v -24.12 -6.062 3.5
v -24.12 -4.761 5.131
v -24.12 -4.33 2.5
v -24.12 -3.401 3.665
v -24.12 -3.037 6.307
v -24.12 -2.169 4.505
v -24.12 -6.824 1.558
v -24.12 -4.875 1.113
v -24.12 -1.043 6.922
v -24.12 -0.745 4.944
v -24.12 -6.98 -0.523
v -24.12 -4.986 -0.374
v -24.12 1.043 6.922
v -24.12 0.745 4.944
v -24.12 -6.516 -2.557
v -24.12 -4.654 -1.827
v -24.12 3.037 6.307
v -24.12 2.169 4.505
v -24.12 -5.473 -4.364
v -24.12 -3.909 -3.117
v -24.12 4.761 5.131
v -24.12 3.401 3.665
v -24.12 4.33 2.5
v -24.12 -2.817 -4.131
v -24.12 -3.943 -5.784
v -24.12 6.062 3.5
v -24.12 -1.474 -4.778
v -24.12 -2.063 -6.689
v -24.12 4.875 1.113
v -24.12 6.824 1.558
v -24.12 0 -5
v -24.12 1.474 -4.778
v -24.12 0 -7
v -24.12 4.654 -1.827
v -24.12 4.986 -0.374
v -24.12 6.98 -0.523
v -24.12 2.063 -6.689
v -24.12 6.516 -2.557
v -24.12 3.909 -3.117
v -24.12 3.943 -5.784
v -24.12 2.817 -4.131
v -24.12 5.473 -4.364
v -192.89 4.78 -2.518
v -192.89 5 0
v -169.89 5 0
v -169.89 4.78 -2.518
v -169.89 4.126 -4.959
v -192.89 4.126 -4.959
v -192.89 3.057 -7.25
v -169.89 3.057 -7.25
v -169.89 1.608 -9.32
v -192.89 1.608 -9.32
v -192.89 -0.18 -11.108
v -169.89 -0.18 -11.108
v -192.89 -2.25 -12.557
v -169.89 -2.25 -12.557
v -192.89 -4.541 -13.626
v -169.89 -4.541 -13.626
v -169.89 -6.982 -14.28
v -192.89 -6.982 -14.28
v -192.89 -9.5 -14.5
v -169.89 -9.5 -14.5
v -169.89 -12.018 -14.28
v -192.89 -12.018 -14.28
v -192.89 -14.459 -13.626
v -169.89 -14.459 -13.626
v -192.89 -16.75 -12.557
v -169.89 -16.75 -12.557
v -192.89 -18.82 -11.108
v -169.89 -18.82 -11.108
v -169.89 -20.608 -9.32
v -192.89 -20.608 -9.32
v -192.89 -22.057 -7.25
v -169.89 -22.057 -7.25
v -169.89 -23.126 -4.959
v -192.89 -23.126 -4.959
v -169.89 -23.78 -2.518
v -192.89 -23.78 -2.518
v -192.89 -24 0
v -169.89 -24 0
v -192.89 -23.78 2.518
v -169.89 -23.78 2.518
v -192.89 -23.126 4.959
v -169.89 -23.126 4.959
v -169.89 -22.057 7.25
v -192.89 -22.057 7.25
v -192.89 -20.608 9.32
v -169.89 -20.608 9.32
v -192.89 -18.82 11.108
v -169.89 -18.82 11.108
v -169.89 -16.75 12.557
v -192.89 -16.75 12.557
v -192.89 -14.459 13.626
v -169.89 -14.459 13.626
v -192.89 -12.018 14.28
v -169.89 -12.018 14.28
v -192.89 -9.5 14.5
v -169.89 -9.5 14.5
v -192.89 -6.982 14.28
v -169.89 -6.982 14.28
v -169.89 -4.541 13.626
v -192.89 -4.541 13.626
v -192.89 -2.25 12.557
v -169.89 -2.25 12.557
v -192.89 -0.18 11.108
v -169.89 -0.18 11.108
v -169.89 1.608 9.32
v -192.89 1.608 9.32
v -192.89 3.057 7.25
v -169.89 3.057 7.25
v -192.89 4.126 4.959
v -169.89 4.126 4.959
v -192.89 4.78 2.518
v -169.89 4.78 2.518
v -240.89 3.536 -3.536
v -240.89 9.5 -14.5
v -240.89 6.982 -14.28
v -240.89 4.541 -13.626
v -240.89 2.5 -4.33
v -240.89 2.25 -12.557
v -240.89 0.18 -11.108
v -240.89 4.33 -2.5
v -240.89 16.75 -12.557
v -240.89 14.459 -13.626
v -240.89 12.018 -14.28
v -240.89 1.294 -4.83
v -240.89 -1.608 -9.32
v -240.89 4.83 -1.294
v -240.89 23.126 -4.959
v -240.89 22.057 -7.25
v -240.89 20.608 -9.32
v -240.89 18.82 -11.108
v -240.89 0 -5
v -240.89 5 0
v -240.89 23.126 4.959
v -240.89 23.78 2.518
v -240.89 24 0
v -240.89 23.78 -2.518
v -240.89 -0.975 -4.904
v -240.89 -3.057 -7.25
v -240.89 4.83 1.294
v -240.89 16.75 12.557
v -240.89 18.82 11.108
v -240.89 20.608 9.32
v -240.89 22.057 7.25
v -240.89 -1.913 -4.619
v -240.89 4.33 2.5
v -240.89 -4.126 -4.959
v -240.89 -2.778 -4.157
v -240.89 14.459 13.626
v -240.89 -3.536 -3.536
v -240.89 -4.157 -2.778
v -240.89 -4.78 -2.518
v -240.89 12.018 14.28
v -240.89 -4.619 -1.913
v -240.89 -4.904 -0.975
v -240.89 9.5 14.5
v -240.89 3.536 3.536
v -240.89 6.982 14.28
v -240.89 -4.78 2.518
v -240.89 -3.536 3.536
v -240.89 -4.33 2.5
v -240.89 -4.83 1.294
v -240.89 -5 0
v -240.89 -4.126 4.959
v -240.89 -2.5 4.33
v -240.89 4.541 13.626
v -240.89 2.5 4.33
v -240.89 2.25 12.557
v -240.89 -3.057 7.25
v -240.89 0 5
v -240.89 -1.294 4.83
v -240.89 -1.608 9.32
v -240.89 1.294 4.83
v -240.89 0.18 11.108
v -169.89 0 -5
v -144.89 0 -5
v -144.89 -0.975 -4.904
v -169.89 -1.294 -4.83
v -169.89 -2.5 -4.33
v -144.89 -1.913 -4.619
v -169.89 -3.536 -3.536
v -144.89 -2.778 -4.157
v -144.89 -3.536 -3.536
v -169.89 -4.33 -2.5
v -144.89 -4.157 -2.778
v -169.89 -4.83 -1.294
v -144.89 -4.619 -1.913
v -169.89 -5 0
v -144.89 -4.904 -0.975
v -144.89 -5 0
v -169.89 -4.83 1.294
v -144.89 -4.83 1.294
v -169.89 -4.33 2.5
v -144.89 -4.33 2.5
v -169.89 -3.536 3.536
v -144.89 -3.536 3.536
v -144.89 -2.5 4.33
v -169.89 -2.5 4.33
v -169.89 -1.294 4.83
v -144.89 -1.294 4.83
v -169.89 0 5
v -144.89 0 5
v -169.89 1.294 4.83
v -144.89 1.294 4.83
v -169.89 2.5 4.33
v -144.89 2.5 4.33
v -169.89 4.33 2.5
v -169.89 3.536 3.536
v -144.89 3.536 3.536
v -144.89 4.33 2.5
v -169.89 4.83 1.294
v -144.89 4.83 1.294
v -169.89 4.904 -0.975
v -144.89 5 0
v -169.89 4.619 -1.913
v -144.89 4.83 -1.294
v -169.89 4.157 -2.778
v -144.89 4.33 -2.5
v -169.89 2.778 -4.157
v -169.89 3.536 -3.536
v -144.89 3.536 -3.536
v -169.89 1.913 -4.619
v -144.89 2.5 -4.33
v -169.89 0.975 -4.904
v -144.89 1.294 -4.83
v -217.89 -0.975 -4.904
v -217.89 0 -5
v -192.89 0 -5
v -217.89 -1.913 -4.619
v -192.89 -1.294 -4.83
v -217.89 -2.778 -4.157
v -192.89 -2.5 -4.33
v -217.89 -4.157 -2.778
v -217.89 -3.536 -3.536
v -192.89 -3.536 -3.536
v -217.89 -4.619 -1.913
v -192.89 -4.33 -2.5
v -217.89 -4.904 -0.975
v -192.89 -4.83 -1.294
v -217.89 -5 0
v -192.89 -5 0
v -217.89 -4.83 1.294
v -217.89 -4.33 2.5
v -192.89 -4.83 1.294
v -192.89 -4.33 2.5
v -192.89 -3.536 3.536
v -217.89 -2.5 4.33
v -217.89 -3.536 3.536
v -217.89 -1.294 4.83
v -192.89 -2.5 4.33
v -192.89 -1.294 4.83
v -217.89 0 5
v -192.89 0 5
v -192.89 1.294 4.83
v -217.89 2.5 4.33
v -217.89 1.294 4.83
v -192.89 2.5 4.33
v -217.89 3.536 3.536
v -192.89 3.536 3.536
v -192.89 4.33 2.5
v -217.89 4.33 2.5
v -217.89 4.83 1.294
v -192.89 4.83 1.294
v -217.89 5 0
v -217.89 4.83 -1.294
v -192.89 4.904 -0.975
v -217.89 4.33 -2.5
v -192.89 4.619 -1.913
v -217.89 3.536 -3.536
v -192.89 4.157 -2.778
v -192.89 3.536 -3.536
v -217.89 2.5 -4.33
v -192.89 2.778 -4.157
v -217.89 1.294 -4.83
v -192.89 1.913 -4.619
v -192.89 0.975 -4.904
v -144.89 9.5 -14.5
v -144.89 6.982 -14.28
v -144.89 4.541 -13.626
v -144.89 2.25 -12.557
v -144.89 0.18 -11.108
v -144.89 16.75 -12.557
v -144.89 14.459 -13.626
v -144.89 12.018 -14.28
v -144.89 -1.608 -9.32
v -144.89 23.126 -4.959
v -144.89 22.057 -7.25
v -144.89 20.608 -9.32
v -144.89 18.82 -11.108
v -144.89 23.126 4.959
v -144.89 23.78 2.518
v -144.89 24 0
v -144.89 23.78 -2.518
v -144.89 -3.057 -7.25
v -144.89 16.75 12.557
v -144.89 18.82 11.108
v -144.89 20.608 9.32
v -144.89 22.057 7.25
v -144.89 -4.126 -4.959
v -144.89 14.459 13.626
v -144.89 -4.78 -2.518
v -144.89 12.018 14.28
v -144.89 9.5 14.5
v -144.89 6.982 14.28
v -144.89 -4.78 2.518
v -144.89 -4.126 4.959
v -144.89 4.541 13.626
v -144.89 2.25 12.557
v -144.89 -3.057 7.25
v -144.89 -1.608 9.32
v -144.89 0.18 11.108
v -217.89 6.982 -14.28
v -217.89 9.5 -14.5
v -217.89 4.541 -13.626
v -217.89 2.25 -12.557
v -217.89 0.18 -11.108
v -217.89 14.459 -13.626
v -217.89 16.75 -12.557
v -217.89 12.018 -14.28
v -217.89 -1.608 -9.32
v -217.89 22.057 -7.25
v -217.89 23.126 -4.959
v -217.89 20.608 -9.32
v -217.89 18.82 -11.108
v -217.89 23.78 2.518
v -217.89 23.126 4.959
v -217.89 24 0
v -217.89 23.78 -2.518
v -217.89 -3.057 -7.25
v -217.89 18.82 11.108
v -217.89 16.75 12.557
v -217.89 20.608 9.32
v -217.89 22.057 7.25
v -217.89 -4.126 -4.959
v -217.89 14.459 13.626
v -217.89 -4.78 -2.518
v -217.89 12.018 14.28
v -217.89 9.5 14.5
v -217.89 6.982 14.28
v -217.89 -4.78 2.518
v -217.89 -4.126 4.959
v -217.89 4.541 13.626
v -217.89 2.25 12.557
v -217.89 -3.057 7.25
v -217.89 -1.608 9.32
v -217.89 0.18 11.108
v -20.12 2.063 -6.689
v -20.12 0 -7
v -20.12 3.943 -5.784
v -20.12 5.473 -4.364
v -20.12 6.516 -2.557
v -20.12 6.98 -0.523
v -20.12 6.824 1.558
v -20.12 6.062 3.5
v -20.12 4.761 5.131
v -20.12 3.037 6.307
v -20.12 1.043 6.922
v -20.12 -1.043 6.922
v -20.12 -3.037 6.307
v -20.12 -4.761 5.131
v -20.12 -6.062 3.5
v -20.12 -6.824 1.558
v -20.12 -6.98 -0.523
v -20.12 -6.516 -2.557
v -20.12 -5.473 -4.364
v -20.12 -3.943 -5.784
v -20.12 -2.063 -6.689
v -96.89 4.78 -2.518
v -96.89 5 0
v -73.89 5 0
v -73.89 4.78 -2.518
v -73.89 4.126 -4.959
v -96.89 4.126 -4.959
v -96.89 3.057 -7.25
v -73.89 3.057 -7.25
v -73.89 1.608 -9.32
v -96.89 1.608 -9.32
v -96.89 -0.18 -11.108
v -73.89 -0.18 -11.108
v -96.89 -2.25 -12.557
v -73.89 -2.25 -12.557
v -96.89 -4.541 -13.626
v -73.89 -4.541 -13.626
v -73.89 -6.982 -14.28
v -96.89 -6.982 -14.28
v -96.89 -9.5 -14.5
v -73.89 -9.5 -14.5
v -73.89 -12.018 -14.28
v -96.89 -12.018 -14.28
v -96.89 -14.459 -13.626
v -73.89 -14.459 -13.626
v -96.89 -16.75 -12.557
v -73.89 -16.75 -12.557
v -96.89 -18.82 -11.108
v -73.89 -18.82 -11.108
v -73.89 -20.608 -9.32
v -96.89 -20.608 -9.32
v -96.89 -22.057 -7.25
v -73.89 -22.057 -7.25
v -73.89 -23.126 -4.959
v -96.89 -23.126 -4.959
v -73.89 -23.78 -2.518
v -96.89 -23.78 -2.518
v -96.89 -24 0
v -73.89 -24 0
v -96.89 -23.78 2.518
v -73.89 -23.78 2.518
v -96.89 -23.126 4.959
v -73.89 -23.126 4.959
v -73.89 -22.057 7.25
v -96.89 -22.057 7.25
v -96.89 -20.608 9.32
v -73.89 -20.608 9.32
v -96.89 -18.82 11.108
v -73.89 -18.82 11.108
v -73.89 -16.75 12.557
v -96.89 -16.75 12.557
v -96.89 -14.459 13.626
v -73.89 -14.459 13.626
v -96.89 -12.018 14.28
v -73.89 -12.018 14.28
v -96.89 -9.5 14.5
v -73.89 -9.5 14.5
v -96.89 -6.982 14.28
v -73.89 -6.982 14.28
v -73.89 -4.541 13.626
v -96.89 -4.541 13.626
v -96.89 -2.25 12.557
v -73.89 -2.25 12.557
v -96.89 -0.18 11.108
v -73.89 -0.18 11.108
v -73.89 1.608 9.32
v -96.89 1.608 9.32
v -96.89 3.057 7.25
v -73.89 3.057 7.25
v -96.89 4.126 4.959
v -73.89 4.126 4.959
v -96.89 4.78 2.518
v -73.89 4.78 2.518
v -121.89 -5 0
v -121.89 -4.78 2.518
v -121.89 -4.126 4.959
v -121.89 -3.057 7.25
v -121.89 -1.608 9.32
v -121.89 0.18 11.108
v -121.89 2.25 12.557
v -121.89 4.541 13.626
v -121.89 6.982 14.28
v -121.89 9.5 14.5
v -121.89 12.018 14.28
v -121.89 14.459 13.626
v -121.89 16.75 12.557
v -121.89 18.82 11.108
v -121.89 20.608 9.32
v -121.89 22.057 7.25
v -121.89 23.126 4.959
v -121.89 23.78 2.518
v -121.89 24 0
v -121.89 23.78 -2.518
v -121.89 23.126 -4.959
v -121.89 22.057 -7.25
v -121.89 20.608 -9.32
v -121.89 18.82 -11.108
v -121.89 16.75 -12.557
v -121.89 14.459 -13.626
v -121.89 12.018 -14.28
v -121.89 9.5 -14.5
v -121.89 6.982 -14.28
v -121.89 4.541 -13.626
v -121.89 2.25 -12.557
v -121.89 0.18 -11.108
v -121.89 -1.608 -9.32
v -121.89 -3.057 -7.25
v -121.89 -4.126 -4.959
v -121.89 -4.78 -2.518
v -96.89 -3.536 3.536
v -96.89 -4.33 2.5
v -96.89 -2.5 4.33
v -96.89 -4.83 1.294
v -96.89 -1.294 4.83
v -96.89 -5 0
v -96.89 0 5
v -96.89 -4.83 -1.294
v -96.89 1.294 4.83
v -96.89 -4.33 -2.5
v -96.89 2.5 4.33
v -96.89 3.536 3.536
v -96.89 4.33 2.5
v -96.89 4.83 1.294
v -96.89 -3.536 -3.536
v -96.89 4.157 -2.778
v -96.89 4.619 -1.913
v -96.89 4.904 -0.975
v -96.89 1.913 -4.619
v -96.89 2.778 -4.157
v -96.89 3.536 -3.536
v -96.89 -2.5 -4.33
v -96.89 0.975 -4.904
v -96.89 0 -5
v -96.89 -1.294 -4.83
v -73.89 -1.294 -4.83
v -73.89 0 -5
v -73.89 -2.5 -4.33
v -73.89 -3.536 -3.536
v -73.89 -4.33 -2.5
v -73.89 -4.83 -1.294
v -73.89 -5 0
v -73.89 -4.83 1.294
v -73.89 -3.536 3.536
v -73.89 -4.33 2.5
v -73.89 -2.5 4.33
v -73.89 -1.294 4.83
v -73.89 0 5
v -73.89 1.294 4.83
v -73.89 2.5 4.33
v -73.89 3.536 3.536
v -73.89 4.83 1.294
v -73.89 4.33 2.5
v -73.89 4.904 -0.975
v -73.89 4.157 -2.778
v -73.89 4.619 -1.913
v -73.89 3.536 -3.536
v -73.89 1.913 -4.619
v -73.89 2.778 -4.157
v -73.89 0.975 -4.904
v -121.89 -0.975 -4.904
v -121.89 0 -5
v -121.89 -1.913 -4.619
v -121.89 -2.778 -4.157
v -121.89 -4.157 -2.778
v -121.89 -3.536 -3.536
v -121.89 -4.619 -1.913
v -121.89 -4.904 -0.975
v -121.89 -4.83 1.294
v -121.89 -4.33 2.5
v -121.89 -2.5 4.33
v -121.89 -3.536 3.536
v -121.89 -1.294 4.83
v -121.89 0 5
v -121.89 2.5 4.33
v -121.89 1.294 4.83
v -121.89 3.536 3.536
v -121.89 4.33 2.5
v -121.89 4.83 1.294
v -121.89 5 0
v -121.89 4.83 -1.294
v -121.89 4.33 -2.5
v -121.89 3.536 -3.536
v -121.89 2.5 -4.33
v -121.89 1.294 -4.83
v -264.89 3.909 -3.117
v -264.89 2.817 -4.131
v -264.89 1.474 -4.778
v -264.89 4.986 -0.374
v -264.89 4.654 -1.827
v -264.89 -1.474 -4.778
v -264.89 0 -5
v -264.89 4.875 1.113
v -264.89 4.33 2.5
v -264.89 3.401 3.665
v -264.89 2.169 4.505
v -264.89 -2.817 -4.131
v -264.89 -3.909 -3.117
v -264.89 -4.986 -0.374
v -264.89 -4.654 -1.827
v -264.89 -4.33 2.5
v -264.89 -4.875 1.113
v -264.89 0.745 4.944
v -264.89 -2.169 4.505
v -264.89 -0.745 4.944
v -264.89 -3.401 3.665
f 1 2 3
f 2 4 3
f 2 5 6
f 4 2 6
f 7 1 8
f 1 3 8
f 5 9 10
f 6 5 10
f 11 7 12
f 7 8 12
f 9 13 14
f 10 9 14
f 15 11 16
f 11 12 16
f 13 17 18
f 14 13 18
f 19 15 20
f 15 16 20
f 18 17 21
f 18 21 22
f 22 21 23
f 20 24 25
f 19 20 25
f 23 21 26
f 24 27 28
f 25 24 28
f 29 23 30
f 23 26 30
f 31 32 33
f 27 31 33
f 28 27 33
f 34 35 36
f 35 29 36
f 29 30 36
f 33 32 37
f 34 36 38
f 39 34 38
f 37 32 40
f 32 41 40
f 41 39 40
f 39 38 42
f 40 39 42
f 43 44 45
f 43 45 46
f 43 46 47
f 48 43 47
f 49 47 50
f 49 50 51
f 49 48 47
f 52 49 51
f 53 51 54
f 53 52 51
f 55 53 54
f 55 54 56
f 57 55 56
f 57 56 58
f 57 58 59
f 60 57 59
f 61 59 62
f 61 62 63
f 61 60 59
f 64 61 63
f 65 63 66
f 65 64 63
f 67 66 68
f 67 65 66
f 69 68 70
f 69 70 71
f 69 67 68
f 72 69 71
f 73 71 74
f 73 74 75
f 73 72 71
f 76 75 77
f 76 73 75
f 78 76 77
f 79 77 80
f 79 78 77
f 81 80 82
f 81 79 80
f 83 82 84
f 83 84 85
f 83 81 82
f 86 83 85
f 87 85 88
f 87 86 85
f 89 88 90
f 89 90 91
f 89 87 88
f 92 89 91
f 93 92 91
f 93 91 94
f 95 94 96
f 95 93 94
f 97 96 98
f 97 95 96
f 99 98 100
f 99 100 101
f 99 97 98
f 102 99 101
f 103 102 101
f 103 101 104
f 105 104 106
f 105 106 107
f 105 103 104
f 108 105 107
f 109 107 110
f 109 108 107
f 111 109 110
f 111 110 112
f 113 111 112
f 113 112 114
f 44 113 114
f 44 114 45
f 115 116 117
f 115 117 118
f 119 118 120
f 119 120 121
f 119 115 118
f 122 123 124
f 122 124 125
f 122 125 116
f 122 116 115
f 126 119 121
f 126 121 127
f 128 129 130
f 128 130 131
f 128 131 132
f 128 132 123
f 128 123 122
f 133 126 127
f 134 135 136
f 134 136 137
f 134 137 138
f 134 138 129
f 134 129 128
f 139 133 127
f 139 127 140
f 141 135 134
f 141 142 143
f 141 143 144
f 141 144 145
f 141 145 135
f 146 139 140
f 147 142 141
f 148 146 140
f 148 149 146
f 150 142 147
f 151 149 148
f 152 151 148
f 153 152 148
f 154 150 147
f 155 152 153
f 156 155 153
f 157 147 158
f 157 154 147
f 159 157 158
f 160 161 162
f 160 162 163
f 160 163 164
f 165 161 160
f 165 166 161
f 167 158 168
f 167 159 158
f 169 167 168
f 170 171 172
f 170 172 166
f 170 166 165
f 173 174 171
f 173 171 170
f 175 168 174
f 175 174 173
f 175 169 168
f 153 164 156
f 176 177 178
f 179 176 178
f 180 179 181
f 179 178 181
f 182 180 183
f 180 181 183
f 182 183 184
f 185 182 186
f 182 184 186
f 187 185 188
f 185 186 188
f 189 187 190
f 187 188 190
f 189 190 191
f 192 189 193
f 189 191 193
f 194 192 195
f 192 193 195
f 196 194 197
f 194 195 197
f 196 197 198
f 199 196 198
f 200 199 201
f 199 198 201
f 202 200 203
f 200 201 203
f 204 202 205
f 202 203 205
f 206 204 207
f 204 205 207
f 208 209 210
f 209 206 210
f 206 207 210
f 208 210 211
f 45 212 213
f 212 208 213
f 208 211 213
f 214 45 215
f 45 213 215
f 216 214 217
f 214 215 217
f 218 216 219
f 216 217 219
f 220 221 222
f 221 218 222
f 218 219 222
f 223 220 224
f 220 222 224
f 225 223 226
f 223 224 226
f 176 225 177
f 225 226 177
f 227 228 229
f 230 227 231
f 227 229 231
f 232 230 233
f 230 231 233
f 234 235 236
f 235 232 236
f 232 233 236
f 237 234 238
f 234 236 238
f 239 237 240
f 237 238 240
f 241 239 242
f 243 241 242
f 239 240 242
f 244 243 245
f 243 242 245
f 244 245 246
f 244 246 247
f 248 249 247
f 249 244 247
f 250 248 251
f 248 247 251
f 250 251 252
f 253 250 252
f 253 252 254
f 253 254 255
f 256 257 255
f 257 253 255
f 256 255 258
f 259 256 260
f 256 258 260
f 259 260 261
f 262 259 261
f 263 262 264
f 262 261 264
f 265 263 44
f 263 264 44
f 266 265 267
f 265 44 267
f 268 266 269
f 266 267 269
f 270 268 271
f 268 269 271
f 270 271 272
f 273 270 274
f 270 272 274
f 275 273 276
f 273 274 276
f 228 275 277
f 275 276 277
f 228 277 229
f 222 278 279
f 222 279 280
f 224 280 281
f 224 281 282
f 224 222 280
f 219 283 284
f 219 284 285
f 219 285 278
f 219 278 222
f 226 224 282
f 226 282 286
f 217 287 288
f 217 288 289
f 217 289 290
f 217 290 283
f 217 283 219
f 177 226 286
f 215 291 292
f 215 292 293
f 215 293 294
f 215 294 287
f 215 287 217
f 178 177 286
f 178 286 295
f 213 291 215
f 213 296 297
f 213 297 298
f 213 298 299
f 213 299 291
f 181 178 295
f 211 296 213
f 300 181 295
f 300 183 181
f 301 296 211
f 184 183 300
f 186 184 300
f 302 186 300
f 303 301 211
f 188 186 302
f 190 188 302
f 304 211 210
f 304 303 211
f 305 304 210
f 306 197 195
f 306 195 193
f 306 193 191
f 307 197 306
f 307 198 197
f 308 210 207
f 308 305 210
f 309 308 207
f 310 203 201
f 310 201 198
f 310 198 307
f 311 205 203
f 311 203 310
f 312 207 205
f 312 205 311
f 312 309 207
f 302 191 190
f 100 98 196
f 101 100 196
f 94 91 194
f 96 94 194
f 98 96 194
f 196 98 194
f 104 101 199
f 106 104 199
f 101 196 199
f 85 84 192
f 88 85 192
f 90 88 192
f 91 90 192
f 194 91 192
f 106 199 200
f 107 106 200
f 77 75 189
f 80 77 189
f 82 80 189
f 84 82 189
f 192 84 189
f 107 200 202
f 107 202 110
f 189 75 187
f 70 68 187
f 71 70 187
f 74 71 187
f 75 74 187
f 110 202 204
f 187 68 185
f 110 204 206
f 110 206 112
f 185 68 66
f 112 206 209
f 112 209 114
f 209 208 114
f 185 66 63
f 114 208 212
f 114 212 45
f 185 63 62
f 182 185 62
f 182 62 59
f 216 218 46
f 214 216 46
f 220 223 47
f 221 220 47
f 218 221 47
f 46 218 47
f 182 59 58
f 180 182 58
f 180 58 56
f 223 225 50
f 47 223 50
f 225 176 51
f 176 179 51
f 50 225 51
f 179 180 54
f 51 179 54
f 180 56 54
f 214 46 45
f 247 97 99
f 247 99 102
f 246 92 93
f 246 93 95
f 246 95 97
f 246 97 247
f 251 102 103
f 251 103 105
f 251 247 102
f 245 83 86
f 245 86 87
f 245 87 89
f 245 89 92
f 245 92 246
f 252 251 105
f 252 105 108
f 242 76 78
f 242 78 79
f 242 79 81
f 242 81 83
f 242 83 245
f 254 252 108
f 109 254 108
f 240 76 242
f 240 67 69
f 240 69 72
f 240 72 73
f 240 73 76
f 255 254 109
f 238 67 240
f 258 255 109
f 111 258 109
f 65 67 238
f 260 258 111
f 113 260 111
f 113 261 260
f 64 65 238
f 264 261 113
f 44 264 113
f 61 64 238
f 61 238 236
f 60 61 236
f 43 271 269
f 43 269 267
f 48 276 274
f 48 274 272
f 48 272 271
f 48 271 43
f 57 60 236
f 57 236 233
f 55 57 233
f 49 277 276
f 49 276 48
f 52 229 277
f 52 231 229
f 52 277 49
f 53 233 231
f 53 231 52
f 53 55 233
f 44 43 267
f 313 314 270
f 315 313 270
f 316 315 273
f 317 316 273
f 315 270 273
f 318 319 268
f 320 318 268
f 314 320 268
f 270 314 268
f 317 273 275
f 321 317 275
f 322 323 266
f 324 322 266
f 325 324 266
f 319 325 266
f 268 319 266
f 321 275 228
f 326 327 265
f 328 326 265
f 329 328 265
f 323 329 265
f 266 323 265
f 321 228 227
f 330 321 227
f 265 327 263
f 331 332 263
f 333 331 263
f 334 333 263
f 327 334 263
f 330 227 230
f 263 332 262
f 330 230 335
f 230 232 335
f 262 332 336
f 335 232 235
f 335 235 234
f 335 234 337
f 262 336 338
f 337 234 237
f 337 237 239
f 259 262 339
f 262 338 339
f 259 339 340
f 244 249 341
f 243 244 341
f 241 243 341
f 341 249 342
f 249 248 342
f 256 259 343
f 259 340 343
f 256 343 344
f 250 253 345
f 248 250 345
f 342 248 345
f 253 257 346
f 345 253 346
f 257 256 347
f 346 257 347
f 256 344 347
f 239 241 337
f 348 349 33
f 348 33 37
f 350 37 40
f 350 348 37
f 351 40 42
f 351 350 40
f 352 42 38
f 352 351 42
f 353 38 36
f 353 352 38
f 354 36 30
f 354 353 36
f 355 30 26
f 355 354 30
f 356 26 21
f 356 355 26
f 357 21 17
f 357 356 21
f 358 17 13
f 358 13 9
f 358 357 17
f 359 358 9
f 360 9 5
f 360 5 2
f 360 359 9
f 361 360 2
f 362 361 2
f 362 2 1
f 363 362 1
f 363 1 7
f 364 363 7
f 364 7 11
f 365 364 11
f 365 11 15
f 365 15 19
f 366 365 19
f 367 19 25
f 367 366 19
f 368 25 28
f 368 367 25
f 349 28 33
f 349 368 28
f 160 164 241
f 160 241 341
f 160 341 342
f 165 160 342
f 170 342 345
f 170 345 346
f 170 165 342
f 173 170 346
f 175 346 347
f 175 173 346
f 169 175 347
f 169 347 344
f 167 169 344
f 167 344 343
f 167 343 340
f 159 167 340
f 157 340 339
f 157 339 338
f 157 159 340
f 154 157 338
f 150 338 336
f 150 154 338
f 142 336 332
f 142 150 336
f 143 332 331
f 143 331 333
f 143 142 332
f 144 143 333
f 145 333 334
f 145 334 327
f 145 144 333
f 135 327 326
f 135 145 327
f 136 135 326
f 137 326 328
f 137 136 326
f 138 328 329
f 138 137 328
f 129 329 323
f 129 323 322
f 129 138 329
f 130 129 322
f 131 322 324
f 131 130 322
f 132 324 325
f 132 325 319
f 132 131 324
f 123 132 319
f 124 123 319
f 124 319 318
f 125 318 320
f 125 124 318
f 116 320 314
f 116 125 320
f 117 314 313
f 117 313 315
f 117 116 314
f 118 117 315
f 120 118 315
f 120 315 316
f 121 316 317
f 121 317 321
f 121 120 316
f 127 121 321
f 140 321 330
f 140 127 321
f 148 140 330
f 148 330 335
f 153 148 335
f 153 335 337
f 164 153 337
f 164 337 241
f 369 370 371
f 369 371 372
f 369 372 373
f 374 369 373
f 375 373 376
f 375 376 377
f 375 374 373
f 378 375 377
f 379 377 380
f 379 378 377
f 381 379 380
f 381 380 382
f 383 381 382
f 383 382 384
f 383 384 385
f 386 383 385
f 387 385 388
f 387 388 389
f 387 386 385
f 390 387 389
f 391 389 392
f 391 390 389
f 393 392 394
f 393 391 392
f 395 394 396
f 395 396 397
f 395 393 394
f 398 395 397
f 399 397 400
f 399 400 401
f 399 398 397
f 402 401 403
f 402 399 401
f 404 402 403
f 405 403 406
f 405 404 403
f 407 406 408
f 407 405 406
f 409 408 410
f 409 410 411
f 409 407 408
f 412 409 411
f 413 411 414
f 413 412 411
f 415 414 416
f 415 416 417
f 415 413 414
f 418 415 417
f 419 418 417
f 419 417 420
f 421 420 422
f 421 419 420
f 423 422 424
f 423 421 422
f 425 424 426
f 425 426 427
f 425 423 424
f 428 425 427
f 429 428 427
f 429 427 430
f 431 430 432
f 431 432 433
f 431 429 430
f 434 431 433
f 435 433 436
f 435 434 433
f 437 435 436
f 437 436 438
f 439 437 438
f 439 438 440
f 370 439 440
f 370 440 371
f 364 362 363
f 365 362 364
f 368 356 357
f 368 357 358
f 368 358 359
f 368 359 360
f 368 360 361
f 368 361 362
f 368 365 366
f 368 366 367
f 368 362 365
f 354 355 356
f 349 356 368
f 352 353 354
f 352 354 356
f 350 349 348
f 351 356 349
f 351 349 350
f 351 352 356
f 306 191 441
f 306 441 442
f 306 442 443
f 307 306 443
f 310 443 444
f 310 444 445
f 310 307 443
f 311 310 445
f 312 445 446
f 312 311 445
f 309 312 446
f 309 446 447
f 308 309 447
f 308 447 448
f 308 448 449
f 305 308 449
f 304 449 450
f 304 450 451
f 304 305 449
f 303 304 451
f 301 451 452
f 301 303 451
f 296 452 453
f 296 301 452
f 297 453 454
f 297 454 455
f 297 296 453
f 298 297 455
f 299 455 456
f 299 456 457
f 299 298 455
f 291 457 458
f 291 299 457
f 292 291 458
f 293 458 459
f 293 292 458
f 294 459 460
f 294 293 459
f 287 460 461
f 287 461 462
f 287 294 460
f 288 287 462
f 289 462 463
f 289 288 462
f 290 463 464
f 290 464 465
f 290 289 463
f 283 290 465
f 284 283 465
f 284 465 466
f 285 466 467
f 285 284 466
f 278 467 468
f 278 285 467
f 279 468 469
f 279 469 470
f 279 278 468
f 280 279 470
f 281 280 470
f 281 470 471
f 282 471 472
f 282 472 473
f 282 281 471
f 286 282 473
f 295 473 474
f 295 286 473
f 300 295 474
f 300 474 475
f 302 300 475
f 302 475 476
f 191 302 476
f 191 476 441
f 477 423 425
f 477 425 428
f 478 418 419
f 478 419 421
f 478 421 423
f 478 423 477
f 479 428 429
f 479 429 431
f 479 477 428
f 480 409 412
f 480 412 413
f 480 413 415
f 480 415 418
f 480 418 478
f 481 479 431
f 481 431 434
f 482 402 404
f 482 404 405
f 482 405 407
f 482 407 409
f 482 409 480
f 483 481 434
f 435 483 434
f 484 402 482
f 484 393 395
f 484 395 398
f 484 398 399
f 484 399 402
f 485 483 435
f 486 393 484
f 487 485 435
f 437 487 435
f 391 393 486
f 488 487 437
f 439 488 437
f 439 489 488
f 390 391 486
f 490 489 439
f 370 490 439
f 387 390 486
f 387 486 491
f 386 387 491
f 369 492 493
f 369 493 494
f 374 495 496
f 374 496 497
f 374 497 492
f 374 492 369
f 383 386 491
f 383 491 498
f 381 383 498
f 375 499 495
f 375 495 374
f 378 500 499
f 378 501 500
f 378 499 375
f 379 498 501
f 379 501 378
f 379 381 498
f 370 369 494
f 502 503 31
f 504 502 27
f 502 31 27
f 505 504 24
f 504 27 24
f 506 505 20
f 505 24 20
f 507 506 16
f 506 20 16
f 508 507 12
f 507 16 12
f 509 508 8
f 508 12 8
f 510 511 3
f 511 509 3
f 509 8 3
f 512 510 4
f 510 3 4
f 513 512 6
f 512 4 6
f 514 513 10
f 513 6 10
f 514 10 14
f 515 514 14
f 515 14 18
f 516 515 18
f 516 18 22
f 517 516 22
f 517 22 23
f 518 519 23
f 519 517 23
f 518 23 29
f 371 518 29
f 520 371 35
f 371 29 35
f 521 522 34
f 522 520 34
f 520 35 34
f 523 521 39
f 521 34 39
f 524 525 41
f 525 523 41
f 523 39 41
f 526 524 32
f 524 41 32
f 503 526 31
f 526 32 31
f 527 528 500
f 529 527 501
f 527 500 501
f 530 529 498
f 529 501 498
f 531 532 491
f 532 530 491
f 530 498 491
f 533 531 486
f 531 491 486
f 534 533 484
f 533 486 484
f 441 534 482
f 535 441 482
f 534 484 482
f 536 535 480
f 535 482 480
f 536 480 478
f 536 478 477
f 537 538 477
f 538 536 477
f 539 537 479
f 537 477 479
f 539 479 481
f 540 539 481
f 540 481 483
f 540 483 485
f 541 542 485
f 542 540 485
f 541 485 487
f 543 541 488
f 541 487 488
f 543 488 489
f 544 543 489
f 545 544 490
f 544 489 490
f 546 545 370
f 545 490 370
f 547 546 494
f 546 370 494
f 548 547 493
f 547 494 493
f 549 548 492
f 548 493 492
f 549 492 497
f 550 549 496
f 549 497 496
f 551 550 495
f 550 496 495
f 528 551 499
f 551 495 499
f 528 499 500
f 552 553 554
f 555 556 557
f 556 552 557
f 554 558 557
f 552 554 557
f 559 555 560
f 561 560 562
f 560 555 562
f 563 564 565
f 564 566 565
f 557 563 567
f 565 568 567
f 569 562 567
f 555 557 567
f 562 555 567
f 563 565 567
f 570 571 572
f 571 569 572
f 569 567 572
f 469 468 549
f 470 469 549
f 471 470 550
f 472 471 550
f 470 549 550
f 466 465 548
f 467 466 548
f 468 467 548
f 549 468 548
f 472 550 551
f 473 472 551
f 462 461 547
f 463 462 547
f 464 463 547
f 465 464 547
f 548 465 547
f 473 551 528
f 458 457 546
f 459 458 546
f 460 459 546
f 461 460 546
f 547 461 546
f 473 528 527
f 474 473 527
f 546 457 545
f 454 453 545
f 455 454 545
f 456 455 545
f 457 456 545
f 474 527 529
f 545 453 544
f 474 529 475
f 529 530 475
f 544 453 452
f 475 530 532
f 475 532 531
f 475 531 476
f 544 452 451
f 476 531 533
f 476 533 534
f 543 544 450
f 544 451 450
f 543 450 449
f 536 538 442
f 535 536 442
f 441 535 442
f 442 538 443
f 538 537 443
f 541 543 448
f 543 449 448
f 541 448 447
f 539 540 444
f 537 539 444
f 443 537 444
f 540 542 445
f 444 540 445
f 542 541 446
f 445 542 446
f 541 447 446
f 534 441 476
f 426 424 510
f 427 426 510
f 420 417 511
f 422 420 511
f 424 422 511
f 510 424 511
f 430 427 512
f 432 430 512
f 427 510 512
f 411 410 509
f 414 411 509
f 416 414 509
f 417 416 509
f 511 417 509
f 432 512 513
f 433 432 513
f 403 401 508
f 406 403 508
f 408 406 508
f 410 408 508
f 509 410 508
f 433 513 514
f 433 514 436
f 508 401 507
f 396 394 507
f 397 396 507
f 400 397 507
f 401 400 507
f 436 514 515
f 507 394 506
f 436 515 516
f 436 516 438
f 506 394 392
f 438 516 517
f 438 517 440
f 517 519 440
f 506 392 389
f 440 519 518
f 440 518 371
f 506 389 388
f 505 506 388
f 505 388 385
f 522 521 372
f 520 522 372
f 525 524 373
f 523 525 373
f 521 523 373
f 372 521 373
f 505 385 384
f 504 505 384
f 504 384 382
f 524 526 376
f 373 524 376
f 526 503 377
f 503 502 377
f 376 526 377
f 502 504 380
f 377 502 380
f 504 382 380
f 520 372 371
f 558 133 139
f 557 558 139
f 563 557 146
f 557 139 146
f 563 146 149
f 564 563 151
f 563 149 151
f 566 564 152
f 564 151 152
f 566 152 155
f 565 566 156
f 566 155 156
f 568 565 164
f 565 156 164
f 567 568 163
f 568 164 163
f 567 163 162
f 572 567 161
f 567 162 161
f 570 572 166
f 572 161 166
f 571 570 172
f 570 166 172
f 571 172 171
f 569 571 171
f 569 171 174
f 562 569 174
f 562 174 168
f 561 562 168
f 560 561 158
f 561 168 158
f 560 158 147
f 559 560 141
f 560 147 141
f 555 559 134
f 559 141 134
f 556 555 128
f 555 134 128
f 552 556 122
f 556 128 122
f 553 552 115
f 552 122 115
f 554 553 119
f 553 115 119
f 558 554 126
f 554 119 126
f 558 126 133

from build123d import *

# Parameters (mm, degrees)
SKETCH_1_W          = 264.89
SKETCH_1_H          = 5
SKETCH_2_R          = 14.5
EXTRUDE_1_DEPTH     = 23
SKETCH_3_R          = 14.5
EXTRUDE_2_DEPTH     = 23
SKETCH_4_R          = 14.5
EXTRUDE_3_DEPTH     = 23
SKETCH_5_R          = 14.5
EXTRUDE_4_DEPTH     = 23
SKETCH_7_R          = 5
CUT_EXTRUDE_1_DEPTH = 20.12
SKETCH_8_R          = 7
EXTRUDE_6_DEPTH     = 4


with BuildPart() as part:
    # 草圖1 → 旋轉1 (revolve)
    with BuildSketch(Plane.XY, mode=Mode.PRIVATE) as revolve_1_sk:
        with Locations((-132.445, 2.5)):
            Rectangle(SKETCH_1_W, SKETCH_1_H)
    revolve(revolve_1_sk.sketch.rotate(Axis((0, 0, 0), (-1, 0, 0)), 90), axis=Axis((0, 0, 0), (-1, 0, 0)))

    # 草圖2 → 填料-伸長1 (add)
    with BuildSketch(Plane.ZY.offset(240.89)):
        with Locations(Location((0, 9.5, 0), (0, 0, 270))):
            Circle(SKETCH_2_R)
    extrude(amount=-EXTRUDE_1_DEPTH)

    # 草圖3 → 填料-伸長2 (add)
    with BuildSketch(Plane.ZY.offset(192.89)):
        with Locations(Location((0, -9.5, 0), (0, 0, 90))):
            Circle(SKETCH_3_R)
    extrude(amount=-EXTRUDE_2_DEPTH)

    # 草圖4 → 填料-伸長3 (add)
    with BuildSketch(Plane.ZY.offset(144.89)):
        with Locations(Location((0, 9.5, 0), (0, 0, 270))):
            Circle(SKETCH_4_R)
    extrude(amount=-EXTRUDE_3_DEPTH)

    # 草圖5 → 填料-伸長4 (add)
    with BuildSketch(Plane.ZY.offset(96.89)):
        with Locations(Location((0, -9.5, 0), (0, 0, 90))):
            Circle(SKETCH_5_R)
    extrude(amount=-EXTRUDE_4_DEPTH)

    # 草圖7 → 除料-伸長1 (cut)
    with BuildSketch(Plane(origin=(0, 0, 0), x_dir=(0, 0, -1), z_dir=(1, 0, 0))):
        Circle(SKETCH_7_R)
    extrude(amount=-CUT_EXTRUDE_1_DEPTH, mode=Mode.SUBTRACT)

    # 草圖8 → 填料-伸長6 (add)
    with BuildSketch(Plane(origin=(-20.12, 0, 0), x_dir=(0, 0, -1), z_dir=(1, 0, 0))):
        Circle(SKETCH_8_R)
    extrude(amount=-EXTRUDE_6_DEPTH)


solid = part.part
